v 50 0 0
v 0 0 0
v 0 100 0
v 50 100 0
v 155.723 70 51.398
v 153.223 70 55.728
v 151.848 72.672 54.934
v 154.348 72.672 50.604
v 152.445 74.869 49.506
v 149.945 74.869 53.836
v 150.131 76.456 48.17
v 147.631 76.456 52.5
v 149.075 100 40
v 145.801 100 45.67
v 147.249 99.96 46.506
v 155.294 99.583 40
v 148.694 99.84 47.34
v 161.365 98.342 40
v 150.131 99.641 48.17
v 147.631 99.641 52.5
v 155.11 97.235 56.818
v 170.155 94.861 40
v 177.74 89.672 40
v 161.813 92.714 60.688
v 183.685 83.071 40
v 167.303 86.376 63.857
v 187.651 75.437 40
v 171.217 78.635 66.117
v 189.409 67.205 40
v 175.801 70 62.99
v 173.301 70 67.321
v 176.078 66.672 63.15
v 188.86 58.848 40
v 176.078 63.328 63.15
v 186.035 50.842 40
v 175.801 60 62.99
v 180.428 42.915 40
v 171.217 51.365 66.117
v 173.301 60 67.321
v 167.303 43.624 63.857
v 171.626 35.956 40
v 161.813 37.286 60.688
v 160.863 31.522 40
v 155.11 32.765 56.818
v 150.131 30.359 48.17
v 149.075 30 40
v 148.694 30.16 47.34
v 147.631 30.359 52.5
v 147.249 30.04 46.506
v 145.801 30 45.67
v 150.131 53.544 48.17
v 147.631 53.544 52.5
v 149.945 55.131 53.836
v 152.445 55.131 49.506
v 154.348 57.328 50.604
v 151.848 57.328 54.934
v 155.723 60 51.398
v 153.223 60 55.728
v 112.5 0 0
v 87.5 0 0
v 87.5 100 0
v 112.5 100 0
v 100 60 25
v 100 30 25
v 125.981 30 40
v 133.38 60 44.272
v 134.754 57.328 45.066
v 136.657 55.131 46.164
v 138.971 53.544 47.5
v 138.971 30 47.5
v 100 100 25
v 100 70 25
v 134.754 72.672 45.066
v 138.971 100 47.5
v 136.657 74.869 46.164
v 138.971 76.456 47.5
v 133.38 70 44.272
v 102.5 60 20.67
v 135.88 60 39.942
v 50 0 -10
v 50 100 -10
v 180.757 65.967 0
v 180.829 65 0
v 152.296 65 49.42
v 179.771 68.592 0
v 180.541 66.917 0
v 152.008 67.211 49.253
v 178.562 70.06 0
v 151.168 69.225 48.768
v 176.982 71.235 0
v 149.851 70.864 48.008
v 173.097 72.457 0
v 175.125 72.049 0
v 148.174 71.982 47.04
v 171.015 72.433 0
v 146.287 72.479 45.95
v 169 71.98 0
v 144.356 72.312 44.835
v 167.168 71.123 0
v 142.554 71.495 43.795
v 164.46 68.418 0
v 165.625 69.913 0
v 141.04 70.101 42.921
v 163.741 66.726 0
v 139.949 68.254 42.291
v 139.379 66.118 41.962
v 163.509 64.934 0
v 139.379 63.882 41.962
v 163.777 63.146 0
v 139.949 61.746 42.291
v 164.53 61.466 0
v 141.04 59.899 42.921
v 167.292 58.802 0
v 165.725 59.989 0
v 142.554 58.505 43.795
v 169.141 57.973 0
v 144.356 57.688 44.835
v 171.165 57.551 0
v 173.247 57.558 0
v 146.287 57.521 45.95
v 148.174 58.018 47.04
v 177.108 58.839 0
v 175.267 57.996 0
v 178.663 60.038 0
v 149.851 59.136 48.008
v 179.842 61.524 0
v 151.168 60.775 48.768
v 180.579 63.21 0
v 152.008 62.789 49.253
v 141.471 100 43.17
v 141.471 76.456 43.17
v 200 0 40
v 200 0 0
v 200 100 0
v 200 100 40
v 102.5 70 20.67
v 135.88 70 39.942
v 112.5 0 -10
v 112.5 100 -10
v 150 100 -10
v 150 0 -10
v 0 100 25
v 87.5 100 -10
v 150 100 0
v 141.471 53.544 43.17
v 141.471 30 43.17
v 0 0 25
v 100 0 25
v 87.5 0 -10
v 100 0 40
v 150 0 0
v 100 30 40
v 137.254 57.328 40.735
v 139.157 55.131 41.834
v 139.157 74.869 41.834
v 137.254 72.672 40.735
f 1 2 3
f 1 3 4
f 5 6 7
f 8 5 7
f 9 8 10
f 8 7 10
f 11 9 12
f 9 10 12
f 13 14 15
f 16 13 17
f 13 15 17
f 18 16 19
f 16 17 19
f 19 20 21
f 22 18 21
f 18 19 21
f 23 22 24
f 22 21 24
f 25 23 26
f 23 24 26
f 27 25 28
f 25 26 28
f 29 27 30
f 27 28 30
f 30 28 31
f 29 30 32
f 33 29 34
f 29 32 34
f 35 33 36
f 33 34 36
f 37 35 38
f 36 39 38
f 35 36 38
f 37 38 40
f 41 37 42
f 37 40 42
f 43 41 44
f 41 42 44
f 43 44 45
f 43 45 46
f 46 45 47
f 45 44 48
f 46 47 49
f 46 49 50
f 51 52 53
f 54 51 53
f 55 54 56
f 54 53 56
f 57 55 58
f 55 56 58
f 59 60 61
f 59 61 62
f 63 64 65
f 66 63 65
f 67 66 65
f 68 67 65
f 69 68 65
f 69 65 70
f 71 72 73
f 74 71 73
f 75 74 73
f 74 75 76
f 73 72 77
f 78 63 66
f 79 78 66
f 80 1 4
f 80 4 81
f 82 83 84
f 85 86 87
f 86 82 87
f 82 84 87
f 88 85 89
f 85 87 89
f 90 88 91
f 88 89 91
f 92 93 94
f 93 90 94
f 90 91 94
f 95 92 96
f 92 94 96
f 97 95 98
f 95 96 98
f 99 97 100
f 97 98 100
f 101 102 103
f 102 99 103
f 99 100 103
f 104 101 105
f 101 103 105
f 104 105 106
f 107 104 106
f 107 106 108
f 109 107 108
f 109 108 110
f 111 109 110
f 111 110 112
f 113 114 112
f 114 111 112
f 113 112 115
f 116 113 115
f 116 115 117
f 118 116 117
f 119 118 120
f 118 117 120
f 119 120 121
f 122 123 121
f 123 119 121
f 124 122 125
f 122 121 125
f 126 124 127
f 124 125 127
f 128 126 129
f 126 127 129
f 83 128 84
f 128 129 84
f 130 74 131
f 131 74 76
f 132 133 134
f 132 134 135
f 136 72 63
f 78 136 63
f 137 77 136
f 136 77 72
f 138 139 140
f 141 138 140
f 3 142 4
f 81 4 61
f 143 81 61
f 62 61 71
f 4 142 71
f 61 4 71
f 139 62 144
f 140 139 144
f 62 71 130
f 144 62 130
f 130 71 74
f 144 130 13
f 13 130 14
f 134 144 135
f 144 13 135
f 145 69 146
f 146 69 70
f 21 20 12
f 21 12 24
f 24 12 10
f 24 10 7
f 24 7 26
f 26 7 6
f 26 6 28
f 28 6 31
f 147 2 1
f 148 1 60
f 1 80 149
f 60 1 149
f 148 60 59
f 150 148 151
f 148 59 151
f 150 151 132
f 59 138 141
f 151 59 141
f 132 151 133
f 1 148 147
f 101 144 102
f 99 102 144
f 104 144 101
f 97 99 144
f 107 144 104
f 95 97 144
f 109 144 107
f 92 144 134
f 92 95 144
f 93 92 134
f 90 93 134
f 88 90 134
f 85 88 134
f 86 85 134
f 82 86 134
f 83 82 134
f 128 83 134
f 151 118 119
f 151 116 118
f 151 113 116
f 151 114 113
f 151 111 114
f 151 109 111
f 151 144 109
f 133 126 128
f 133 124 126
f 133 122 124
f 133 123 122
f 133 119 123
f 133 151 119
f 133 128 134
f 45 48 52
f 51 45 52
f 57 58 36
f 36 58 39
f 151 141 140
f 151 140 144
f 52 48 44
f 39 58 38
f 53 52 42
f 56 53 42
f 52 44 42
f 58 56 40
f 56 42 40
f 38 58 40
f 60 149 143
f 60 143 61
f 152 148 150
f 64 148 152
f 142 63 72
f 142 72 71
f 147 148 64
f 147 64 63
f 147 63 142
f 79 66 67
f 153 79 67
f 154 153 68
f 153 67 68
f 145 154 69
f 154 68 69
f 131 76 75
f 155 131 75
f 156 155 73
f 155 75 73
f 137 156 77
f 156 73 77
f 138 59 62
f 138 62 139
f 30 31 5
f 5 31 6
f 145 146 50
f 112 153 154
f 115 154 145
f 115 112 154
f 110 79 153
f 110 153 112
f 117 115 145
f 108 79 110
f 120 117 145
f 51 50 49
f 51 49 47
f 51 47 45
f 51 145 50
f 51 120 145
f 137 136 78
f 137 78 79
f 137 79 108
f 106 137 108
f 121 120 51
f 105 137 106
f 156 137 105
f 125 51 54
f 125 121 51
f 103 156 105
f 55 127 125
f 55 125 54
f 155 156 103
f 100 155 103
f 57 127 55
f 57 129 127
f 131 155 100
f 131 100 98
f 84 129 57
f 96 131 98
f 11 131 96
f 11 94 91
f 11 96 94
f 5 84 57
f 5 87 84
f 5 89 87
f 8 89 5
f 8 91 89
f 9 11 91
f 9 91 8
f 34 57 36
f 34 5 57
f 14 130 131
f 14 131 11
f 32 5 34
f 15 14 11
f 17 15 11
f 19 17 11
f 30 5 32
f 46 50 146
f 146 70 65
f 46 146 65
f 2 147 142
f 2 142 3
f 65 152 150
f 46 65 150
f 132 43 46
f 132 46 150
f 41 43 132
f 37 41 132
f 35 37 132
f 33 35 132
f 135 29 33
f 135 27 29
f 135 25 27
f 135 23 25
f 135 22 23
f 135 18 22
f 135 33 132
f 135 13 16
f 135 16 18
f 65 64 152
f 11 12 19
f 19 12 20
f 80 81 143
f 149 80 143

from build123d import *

# Parameters (mm, degrees)
F1_DEPTH  = 100
F5_DEPTH  = 40
F7_DEPTH  = 5
F8_R      = 7.5
F9_DEPTH  = 75.3118891325
F10_W     = 40
F10_H     = 30
F11_DEPTH = 15


with BuildPart() as f1:
    # F0 (on Front) → F1 (new body)
    with BuildSketch(Plane.XZ):
        Polygon((0, 25), (0, 0), (50, 0), (50, -10), (87.5, -10), (87.5, 0), (112.5, 0), (112.5, -10), (150, -10), (150, 0), (200, 0), (200, 40), (140, 40), (140, 25), align=None)
    extrude(amount=-F1_DEPTH)

    # F4 (on line) → F5 (join)
    with BuildSketch(Plane(origin=(14.1746824527, 0, -24.5512701892), x_dir=(0.8660254038, 0, 0.5), z_dir=(0.5, 0, -0.8660254038))):
        with BuildLine():
            Line((99.1025403784, -30), (99.1025403784, -100))
            Line((99.1025403784, -100), (149.1025403784, -100))
            ThreePointArc((149.1025403784, -100), (184.1025403784, -65), (149.1025403784, -30))
            Line((149.1025403784, -30), (99.1025403784, -30))
        make_face()
    extrude(amount=F5_DEPTH)

    # F6 (on face) → F7 (cut)
    with BuildSketch(Plane(origin=(14.1746824527, 0, -24.5512701892), x_dir=(0.8660254038, 0, 0.5), z_dir=(-0.5, 0, 0.8660254038))):
        with BuildLine():
            Line((154.1025403784, 100), (144.1025403784, 100))
            Line((144.1025403784, 100), (144.1025403784, 76.4564392374))
            ThreePointArc((144.1025403784, 76.4564392374), (140.2637056136, 73.8388347648), (137.6461011411, 70))
            Line((137.6461011411, 70), (99.1025403784, 70))
            Line((99.1025403784, 70), (99.1025403784, 59.9999986589))
            Line((99.1025403784, 59.9999986589), (137.6461017264, 59.9999986589))
            ThreePointArc((137.6461017264, 59.9999986589), (140.263706131, 56.1611647178), (144.1025403784, 53.5435607626))
            Line((144.1025403784, 53.5435607626), (144.1025403784, 30))
            Line((144.1025403784, 30), (154.1025403784, 30))
            Line((154.1025403784, 30), (154.1025403784, 53.5435607626))
            ThreePointArc((154.1025403784, 53.5435607626), (157.9413746259, 56.1611647178), (160.5589790305, 59.9999986589))
            Line((160.5589790305, 59.9999986589), (184.1025403784, 59.9999986589))
            Line((184.1025403784, 59.9999986589), (184.1025403784, 70))
            Line((184.1025403784, 70), (160.5589796158, 70))
            ThreePointArc((160.5589796158, 70), (157.9413751433, 73.8388347648), (154.1025403784, 76.4564392374))
            Line((154.1025403784, 76.4564392374), (154.1025403784, 100))
        make_face()
    extrude(amount=-F7_DEPTH, mode=Mode.SUBTRACT)

    # F8 (on face) → F9 (cut, through all)
    with BuildSketch(Plane(origin=(16.6746824527, 0, -28.8813972081), x_dir=(0.8660254038, 0, 0.5), z_dir=(-0.5, 0, 0.8660254038))):
        with Locations((149.1025403784, 65)):
            Circle(F8_R)
    extrude(amount=-F9_DEPTH, mode=Mode.SUBTRACT)

    # F10 (on face) → F11 (join, through all)
    with BuildSketch(Plane.XY.offset(25)):
        with Locations((120, 15)):
            Rectangle(F10_W, F10_H)
    extrude(amount=F11_DEPTH)


solid = f1.part
